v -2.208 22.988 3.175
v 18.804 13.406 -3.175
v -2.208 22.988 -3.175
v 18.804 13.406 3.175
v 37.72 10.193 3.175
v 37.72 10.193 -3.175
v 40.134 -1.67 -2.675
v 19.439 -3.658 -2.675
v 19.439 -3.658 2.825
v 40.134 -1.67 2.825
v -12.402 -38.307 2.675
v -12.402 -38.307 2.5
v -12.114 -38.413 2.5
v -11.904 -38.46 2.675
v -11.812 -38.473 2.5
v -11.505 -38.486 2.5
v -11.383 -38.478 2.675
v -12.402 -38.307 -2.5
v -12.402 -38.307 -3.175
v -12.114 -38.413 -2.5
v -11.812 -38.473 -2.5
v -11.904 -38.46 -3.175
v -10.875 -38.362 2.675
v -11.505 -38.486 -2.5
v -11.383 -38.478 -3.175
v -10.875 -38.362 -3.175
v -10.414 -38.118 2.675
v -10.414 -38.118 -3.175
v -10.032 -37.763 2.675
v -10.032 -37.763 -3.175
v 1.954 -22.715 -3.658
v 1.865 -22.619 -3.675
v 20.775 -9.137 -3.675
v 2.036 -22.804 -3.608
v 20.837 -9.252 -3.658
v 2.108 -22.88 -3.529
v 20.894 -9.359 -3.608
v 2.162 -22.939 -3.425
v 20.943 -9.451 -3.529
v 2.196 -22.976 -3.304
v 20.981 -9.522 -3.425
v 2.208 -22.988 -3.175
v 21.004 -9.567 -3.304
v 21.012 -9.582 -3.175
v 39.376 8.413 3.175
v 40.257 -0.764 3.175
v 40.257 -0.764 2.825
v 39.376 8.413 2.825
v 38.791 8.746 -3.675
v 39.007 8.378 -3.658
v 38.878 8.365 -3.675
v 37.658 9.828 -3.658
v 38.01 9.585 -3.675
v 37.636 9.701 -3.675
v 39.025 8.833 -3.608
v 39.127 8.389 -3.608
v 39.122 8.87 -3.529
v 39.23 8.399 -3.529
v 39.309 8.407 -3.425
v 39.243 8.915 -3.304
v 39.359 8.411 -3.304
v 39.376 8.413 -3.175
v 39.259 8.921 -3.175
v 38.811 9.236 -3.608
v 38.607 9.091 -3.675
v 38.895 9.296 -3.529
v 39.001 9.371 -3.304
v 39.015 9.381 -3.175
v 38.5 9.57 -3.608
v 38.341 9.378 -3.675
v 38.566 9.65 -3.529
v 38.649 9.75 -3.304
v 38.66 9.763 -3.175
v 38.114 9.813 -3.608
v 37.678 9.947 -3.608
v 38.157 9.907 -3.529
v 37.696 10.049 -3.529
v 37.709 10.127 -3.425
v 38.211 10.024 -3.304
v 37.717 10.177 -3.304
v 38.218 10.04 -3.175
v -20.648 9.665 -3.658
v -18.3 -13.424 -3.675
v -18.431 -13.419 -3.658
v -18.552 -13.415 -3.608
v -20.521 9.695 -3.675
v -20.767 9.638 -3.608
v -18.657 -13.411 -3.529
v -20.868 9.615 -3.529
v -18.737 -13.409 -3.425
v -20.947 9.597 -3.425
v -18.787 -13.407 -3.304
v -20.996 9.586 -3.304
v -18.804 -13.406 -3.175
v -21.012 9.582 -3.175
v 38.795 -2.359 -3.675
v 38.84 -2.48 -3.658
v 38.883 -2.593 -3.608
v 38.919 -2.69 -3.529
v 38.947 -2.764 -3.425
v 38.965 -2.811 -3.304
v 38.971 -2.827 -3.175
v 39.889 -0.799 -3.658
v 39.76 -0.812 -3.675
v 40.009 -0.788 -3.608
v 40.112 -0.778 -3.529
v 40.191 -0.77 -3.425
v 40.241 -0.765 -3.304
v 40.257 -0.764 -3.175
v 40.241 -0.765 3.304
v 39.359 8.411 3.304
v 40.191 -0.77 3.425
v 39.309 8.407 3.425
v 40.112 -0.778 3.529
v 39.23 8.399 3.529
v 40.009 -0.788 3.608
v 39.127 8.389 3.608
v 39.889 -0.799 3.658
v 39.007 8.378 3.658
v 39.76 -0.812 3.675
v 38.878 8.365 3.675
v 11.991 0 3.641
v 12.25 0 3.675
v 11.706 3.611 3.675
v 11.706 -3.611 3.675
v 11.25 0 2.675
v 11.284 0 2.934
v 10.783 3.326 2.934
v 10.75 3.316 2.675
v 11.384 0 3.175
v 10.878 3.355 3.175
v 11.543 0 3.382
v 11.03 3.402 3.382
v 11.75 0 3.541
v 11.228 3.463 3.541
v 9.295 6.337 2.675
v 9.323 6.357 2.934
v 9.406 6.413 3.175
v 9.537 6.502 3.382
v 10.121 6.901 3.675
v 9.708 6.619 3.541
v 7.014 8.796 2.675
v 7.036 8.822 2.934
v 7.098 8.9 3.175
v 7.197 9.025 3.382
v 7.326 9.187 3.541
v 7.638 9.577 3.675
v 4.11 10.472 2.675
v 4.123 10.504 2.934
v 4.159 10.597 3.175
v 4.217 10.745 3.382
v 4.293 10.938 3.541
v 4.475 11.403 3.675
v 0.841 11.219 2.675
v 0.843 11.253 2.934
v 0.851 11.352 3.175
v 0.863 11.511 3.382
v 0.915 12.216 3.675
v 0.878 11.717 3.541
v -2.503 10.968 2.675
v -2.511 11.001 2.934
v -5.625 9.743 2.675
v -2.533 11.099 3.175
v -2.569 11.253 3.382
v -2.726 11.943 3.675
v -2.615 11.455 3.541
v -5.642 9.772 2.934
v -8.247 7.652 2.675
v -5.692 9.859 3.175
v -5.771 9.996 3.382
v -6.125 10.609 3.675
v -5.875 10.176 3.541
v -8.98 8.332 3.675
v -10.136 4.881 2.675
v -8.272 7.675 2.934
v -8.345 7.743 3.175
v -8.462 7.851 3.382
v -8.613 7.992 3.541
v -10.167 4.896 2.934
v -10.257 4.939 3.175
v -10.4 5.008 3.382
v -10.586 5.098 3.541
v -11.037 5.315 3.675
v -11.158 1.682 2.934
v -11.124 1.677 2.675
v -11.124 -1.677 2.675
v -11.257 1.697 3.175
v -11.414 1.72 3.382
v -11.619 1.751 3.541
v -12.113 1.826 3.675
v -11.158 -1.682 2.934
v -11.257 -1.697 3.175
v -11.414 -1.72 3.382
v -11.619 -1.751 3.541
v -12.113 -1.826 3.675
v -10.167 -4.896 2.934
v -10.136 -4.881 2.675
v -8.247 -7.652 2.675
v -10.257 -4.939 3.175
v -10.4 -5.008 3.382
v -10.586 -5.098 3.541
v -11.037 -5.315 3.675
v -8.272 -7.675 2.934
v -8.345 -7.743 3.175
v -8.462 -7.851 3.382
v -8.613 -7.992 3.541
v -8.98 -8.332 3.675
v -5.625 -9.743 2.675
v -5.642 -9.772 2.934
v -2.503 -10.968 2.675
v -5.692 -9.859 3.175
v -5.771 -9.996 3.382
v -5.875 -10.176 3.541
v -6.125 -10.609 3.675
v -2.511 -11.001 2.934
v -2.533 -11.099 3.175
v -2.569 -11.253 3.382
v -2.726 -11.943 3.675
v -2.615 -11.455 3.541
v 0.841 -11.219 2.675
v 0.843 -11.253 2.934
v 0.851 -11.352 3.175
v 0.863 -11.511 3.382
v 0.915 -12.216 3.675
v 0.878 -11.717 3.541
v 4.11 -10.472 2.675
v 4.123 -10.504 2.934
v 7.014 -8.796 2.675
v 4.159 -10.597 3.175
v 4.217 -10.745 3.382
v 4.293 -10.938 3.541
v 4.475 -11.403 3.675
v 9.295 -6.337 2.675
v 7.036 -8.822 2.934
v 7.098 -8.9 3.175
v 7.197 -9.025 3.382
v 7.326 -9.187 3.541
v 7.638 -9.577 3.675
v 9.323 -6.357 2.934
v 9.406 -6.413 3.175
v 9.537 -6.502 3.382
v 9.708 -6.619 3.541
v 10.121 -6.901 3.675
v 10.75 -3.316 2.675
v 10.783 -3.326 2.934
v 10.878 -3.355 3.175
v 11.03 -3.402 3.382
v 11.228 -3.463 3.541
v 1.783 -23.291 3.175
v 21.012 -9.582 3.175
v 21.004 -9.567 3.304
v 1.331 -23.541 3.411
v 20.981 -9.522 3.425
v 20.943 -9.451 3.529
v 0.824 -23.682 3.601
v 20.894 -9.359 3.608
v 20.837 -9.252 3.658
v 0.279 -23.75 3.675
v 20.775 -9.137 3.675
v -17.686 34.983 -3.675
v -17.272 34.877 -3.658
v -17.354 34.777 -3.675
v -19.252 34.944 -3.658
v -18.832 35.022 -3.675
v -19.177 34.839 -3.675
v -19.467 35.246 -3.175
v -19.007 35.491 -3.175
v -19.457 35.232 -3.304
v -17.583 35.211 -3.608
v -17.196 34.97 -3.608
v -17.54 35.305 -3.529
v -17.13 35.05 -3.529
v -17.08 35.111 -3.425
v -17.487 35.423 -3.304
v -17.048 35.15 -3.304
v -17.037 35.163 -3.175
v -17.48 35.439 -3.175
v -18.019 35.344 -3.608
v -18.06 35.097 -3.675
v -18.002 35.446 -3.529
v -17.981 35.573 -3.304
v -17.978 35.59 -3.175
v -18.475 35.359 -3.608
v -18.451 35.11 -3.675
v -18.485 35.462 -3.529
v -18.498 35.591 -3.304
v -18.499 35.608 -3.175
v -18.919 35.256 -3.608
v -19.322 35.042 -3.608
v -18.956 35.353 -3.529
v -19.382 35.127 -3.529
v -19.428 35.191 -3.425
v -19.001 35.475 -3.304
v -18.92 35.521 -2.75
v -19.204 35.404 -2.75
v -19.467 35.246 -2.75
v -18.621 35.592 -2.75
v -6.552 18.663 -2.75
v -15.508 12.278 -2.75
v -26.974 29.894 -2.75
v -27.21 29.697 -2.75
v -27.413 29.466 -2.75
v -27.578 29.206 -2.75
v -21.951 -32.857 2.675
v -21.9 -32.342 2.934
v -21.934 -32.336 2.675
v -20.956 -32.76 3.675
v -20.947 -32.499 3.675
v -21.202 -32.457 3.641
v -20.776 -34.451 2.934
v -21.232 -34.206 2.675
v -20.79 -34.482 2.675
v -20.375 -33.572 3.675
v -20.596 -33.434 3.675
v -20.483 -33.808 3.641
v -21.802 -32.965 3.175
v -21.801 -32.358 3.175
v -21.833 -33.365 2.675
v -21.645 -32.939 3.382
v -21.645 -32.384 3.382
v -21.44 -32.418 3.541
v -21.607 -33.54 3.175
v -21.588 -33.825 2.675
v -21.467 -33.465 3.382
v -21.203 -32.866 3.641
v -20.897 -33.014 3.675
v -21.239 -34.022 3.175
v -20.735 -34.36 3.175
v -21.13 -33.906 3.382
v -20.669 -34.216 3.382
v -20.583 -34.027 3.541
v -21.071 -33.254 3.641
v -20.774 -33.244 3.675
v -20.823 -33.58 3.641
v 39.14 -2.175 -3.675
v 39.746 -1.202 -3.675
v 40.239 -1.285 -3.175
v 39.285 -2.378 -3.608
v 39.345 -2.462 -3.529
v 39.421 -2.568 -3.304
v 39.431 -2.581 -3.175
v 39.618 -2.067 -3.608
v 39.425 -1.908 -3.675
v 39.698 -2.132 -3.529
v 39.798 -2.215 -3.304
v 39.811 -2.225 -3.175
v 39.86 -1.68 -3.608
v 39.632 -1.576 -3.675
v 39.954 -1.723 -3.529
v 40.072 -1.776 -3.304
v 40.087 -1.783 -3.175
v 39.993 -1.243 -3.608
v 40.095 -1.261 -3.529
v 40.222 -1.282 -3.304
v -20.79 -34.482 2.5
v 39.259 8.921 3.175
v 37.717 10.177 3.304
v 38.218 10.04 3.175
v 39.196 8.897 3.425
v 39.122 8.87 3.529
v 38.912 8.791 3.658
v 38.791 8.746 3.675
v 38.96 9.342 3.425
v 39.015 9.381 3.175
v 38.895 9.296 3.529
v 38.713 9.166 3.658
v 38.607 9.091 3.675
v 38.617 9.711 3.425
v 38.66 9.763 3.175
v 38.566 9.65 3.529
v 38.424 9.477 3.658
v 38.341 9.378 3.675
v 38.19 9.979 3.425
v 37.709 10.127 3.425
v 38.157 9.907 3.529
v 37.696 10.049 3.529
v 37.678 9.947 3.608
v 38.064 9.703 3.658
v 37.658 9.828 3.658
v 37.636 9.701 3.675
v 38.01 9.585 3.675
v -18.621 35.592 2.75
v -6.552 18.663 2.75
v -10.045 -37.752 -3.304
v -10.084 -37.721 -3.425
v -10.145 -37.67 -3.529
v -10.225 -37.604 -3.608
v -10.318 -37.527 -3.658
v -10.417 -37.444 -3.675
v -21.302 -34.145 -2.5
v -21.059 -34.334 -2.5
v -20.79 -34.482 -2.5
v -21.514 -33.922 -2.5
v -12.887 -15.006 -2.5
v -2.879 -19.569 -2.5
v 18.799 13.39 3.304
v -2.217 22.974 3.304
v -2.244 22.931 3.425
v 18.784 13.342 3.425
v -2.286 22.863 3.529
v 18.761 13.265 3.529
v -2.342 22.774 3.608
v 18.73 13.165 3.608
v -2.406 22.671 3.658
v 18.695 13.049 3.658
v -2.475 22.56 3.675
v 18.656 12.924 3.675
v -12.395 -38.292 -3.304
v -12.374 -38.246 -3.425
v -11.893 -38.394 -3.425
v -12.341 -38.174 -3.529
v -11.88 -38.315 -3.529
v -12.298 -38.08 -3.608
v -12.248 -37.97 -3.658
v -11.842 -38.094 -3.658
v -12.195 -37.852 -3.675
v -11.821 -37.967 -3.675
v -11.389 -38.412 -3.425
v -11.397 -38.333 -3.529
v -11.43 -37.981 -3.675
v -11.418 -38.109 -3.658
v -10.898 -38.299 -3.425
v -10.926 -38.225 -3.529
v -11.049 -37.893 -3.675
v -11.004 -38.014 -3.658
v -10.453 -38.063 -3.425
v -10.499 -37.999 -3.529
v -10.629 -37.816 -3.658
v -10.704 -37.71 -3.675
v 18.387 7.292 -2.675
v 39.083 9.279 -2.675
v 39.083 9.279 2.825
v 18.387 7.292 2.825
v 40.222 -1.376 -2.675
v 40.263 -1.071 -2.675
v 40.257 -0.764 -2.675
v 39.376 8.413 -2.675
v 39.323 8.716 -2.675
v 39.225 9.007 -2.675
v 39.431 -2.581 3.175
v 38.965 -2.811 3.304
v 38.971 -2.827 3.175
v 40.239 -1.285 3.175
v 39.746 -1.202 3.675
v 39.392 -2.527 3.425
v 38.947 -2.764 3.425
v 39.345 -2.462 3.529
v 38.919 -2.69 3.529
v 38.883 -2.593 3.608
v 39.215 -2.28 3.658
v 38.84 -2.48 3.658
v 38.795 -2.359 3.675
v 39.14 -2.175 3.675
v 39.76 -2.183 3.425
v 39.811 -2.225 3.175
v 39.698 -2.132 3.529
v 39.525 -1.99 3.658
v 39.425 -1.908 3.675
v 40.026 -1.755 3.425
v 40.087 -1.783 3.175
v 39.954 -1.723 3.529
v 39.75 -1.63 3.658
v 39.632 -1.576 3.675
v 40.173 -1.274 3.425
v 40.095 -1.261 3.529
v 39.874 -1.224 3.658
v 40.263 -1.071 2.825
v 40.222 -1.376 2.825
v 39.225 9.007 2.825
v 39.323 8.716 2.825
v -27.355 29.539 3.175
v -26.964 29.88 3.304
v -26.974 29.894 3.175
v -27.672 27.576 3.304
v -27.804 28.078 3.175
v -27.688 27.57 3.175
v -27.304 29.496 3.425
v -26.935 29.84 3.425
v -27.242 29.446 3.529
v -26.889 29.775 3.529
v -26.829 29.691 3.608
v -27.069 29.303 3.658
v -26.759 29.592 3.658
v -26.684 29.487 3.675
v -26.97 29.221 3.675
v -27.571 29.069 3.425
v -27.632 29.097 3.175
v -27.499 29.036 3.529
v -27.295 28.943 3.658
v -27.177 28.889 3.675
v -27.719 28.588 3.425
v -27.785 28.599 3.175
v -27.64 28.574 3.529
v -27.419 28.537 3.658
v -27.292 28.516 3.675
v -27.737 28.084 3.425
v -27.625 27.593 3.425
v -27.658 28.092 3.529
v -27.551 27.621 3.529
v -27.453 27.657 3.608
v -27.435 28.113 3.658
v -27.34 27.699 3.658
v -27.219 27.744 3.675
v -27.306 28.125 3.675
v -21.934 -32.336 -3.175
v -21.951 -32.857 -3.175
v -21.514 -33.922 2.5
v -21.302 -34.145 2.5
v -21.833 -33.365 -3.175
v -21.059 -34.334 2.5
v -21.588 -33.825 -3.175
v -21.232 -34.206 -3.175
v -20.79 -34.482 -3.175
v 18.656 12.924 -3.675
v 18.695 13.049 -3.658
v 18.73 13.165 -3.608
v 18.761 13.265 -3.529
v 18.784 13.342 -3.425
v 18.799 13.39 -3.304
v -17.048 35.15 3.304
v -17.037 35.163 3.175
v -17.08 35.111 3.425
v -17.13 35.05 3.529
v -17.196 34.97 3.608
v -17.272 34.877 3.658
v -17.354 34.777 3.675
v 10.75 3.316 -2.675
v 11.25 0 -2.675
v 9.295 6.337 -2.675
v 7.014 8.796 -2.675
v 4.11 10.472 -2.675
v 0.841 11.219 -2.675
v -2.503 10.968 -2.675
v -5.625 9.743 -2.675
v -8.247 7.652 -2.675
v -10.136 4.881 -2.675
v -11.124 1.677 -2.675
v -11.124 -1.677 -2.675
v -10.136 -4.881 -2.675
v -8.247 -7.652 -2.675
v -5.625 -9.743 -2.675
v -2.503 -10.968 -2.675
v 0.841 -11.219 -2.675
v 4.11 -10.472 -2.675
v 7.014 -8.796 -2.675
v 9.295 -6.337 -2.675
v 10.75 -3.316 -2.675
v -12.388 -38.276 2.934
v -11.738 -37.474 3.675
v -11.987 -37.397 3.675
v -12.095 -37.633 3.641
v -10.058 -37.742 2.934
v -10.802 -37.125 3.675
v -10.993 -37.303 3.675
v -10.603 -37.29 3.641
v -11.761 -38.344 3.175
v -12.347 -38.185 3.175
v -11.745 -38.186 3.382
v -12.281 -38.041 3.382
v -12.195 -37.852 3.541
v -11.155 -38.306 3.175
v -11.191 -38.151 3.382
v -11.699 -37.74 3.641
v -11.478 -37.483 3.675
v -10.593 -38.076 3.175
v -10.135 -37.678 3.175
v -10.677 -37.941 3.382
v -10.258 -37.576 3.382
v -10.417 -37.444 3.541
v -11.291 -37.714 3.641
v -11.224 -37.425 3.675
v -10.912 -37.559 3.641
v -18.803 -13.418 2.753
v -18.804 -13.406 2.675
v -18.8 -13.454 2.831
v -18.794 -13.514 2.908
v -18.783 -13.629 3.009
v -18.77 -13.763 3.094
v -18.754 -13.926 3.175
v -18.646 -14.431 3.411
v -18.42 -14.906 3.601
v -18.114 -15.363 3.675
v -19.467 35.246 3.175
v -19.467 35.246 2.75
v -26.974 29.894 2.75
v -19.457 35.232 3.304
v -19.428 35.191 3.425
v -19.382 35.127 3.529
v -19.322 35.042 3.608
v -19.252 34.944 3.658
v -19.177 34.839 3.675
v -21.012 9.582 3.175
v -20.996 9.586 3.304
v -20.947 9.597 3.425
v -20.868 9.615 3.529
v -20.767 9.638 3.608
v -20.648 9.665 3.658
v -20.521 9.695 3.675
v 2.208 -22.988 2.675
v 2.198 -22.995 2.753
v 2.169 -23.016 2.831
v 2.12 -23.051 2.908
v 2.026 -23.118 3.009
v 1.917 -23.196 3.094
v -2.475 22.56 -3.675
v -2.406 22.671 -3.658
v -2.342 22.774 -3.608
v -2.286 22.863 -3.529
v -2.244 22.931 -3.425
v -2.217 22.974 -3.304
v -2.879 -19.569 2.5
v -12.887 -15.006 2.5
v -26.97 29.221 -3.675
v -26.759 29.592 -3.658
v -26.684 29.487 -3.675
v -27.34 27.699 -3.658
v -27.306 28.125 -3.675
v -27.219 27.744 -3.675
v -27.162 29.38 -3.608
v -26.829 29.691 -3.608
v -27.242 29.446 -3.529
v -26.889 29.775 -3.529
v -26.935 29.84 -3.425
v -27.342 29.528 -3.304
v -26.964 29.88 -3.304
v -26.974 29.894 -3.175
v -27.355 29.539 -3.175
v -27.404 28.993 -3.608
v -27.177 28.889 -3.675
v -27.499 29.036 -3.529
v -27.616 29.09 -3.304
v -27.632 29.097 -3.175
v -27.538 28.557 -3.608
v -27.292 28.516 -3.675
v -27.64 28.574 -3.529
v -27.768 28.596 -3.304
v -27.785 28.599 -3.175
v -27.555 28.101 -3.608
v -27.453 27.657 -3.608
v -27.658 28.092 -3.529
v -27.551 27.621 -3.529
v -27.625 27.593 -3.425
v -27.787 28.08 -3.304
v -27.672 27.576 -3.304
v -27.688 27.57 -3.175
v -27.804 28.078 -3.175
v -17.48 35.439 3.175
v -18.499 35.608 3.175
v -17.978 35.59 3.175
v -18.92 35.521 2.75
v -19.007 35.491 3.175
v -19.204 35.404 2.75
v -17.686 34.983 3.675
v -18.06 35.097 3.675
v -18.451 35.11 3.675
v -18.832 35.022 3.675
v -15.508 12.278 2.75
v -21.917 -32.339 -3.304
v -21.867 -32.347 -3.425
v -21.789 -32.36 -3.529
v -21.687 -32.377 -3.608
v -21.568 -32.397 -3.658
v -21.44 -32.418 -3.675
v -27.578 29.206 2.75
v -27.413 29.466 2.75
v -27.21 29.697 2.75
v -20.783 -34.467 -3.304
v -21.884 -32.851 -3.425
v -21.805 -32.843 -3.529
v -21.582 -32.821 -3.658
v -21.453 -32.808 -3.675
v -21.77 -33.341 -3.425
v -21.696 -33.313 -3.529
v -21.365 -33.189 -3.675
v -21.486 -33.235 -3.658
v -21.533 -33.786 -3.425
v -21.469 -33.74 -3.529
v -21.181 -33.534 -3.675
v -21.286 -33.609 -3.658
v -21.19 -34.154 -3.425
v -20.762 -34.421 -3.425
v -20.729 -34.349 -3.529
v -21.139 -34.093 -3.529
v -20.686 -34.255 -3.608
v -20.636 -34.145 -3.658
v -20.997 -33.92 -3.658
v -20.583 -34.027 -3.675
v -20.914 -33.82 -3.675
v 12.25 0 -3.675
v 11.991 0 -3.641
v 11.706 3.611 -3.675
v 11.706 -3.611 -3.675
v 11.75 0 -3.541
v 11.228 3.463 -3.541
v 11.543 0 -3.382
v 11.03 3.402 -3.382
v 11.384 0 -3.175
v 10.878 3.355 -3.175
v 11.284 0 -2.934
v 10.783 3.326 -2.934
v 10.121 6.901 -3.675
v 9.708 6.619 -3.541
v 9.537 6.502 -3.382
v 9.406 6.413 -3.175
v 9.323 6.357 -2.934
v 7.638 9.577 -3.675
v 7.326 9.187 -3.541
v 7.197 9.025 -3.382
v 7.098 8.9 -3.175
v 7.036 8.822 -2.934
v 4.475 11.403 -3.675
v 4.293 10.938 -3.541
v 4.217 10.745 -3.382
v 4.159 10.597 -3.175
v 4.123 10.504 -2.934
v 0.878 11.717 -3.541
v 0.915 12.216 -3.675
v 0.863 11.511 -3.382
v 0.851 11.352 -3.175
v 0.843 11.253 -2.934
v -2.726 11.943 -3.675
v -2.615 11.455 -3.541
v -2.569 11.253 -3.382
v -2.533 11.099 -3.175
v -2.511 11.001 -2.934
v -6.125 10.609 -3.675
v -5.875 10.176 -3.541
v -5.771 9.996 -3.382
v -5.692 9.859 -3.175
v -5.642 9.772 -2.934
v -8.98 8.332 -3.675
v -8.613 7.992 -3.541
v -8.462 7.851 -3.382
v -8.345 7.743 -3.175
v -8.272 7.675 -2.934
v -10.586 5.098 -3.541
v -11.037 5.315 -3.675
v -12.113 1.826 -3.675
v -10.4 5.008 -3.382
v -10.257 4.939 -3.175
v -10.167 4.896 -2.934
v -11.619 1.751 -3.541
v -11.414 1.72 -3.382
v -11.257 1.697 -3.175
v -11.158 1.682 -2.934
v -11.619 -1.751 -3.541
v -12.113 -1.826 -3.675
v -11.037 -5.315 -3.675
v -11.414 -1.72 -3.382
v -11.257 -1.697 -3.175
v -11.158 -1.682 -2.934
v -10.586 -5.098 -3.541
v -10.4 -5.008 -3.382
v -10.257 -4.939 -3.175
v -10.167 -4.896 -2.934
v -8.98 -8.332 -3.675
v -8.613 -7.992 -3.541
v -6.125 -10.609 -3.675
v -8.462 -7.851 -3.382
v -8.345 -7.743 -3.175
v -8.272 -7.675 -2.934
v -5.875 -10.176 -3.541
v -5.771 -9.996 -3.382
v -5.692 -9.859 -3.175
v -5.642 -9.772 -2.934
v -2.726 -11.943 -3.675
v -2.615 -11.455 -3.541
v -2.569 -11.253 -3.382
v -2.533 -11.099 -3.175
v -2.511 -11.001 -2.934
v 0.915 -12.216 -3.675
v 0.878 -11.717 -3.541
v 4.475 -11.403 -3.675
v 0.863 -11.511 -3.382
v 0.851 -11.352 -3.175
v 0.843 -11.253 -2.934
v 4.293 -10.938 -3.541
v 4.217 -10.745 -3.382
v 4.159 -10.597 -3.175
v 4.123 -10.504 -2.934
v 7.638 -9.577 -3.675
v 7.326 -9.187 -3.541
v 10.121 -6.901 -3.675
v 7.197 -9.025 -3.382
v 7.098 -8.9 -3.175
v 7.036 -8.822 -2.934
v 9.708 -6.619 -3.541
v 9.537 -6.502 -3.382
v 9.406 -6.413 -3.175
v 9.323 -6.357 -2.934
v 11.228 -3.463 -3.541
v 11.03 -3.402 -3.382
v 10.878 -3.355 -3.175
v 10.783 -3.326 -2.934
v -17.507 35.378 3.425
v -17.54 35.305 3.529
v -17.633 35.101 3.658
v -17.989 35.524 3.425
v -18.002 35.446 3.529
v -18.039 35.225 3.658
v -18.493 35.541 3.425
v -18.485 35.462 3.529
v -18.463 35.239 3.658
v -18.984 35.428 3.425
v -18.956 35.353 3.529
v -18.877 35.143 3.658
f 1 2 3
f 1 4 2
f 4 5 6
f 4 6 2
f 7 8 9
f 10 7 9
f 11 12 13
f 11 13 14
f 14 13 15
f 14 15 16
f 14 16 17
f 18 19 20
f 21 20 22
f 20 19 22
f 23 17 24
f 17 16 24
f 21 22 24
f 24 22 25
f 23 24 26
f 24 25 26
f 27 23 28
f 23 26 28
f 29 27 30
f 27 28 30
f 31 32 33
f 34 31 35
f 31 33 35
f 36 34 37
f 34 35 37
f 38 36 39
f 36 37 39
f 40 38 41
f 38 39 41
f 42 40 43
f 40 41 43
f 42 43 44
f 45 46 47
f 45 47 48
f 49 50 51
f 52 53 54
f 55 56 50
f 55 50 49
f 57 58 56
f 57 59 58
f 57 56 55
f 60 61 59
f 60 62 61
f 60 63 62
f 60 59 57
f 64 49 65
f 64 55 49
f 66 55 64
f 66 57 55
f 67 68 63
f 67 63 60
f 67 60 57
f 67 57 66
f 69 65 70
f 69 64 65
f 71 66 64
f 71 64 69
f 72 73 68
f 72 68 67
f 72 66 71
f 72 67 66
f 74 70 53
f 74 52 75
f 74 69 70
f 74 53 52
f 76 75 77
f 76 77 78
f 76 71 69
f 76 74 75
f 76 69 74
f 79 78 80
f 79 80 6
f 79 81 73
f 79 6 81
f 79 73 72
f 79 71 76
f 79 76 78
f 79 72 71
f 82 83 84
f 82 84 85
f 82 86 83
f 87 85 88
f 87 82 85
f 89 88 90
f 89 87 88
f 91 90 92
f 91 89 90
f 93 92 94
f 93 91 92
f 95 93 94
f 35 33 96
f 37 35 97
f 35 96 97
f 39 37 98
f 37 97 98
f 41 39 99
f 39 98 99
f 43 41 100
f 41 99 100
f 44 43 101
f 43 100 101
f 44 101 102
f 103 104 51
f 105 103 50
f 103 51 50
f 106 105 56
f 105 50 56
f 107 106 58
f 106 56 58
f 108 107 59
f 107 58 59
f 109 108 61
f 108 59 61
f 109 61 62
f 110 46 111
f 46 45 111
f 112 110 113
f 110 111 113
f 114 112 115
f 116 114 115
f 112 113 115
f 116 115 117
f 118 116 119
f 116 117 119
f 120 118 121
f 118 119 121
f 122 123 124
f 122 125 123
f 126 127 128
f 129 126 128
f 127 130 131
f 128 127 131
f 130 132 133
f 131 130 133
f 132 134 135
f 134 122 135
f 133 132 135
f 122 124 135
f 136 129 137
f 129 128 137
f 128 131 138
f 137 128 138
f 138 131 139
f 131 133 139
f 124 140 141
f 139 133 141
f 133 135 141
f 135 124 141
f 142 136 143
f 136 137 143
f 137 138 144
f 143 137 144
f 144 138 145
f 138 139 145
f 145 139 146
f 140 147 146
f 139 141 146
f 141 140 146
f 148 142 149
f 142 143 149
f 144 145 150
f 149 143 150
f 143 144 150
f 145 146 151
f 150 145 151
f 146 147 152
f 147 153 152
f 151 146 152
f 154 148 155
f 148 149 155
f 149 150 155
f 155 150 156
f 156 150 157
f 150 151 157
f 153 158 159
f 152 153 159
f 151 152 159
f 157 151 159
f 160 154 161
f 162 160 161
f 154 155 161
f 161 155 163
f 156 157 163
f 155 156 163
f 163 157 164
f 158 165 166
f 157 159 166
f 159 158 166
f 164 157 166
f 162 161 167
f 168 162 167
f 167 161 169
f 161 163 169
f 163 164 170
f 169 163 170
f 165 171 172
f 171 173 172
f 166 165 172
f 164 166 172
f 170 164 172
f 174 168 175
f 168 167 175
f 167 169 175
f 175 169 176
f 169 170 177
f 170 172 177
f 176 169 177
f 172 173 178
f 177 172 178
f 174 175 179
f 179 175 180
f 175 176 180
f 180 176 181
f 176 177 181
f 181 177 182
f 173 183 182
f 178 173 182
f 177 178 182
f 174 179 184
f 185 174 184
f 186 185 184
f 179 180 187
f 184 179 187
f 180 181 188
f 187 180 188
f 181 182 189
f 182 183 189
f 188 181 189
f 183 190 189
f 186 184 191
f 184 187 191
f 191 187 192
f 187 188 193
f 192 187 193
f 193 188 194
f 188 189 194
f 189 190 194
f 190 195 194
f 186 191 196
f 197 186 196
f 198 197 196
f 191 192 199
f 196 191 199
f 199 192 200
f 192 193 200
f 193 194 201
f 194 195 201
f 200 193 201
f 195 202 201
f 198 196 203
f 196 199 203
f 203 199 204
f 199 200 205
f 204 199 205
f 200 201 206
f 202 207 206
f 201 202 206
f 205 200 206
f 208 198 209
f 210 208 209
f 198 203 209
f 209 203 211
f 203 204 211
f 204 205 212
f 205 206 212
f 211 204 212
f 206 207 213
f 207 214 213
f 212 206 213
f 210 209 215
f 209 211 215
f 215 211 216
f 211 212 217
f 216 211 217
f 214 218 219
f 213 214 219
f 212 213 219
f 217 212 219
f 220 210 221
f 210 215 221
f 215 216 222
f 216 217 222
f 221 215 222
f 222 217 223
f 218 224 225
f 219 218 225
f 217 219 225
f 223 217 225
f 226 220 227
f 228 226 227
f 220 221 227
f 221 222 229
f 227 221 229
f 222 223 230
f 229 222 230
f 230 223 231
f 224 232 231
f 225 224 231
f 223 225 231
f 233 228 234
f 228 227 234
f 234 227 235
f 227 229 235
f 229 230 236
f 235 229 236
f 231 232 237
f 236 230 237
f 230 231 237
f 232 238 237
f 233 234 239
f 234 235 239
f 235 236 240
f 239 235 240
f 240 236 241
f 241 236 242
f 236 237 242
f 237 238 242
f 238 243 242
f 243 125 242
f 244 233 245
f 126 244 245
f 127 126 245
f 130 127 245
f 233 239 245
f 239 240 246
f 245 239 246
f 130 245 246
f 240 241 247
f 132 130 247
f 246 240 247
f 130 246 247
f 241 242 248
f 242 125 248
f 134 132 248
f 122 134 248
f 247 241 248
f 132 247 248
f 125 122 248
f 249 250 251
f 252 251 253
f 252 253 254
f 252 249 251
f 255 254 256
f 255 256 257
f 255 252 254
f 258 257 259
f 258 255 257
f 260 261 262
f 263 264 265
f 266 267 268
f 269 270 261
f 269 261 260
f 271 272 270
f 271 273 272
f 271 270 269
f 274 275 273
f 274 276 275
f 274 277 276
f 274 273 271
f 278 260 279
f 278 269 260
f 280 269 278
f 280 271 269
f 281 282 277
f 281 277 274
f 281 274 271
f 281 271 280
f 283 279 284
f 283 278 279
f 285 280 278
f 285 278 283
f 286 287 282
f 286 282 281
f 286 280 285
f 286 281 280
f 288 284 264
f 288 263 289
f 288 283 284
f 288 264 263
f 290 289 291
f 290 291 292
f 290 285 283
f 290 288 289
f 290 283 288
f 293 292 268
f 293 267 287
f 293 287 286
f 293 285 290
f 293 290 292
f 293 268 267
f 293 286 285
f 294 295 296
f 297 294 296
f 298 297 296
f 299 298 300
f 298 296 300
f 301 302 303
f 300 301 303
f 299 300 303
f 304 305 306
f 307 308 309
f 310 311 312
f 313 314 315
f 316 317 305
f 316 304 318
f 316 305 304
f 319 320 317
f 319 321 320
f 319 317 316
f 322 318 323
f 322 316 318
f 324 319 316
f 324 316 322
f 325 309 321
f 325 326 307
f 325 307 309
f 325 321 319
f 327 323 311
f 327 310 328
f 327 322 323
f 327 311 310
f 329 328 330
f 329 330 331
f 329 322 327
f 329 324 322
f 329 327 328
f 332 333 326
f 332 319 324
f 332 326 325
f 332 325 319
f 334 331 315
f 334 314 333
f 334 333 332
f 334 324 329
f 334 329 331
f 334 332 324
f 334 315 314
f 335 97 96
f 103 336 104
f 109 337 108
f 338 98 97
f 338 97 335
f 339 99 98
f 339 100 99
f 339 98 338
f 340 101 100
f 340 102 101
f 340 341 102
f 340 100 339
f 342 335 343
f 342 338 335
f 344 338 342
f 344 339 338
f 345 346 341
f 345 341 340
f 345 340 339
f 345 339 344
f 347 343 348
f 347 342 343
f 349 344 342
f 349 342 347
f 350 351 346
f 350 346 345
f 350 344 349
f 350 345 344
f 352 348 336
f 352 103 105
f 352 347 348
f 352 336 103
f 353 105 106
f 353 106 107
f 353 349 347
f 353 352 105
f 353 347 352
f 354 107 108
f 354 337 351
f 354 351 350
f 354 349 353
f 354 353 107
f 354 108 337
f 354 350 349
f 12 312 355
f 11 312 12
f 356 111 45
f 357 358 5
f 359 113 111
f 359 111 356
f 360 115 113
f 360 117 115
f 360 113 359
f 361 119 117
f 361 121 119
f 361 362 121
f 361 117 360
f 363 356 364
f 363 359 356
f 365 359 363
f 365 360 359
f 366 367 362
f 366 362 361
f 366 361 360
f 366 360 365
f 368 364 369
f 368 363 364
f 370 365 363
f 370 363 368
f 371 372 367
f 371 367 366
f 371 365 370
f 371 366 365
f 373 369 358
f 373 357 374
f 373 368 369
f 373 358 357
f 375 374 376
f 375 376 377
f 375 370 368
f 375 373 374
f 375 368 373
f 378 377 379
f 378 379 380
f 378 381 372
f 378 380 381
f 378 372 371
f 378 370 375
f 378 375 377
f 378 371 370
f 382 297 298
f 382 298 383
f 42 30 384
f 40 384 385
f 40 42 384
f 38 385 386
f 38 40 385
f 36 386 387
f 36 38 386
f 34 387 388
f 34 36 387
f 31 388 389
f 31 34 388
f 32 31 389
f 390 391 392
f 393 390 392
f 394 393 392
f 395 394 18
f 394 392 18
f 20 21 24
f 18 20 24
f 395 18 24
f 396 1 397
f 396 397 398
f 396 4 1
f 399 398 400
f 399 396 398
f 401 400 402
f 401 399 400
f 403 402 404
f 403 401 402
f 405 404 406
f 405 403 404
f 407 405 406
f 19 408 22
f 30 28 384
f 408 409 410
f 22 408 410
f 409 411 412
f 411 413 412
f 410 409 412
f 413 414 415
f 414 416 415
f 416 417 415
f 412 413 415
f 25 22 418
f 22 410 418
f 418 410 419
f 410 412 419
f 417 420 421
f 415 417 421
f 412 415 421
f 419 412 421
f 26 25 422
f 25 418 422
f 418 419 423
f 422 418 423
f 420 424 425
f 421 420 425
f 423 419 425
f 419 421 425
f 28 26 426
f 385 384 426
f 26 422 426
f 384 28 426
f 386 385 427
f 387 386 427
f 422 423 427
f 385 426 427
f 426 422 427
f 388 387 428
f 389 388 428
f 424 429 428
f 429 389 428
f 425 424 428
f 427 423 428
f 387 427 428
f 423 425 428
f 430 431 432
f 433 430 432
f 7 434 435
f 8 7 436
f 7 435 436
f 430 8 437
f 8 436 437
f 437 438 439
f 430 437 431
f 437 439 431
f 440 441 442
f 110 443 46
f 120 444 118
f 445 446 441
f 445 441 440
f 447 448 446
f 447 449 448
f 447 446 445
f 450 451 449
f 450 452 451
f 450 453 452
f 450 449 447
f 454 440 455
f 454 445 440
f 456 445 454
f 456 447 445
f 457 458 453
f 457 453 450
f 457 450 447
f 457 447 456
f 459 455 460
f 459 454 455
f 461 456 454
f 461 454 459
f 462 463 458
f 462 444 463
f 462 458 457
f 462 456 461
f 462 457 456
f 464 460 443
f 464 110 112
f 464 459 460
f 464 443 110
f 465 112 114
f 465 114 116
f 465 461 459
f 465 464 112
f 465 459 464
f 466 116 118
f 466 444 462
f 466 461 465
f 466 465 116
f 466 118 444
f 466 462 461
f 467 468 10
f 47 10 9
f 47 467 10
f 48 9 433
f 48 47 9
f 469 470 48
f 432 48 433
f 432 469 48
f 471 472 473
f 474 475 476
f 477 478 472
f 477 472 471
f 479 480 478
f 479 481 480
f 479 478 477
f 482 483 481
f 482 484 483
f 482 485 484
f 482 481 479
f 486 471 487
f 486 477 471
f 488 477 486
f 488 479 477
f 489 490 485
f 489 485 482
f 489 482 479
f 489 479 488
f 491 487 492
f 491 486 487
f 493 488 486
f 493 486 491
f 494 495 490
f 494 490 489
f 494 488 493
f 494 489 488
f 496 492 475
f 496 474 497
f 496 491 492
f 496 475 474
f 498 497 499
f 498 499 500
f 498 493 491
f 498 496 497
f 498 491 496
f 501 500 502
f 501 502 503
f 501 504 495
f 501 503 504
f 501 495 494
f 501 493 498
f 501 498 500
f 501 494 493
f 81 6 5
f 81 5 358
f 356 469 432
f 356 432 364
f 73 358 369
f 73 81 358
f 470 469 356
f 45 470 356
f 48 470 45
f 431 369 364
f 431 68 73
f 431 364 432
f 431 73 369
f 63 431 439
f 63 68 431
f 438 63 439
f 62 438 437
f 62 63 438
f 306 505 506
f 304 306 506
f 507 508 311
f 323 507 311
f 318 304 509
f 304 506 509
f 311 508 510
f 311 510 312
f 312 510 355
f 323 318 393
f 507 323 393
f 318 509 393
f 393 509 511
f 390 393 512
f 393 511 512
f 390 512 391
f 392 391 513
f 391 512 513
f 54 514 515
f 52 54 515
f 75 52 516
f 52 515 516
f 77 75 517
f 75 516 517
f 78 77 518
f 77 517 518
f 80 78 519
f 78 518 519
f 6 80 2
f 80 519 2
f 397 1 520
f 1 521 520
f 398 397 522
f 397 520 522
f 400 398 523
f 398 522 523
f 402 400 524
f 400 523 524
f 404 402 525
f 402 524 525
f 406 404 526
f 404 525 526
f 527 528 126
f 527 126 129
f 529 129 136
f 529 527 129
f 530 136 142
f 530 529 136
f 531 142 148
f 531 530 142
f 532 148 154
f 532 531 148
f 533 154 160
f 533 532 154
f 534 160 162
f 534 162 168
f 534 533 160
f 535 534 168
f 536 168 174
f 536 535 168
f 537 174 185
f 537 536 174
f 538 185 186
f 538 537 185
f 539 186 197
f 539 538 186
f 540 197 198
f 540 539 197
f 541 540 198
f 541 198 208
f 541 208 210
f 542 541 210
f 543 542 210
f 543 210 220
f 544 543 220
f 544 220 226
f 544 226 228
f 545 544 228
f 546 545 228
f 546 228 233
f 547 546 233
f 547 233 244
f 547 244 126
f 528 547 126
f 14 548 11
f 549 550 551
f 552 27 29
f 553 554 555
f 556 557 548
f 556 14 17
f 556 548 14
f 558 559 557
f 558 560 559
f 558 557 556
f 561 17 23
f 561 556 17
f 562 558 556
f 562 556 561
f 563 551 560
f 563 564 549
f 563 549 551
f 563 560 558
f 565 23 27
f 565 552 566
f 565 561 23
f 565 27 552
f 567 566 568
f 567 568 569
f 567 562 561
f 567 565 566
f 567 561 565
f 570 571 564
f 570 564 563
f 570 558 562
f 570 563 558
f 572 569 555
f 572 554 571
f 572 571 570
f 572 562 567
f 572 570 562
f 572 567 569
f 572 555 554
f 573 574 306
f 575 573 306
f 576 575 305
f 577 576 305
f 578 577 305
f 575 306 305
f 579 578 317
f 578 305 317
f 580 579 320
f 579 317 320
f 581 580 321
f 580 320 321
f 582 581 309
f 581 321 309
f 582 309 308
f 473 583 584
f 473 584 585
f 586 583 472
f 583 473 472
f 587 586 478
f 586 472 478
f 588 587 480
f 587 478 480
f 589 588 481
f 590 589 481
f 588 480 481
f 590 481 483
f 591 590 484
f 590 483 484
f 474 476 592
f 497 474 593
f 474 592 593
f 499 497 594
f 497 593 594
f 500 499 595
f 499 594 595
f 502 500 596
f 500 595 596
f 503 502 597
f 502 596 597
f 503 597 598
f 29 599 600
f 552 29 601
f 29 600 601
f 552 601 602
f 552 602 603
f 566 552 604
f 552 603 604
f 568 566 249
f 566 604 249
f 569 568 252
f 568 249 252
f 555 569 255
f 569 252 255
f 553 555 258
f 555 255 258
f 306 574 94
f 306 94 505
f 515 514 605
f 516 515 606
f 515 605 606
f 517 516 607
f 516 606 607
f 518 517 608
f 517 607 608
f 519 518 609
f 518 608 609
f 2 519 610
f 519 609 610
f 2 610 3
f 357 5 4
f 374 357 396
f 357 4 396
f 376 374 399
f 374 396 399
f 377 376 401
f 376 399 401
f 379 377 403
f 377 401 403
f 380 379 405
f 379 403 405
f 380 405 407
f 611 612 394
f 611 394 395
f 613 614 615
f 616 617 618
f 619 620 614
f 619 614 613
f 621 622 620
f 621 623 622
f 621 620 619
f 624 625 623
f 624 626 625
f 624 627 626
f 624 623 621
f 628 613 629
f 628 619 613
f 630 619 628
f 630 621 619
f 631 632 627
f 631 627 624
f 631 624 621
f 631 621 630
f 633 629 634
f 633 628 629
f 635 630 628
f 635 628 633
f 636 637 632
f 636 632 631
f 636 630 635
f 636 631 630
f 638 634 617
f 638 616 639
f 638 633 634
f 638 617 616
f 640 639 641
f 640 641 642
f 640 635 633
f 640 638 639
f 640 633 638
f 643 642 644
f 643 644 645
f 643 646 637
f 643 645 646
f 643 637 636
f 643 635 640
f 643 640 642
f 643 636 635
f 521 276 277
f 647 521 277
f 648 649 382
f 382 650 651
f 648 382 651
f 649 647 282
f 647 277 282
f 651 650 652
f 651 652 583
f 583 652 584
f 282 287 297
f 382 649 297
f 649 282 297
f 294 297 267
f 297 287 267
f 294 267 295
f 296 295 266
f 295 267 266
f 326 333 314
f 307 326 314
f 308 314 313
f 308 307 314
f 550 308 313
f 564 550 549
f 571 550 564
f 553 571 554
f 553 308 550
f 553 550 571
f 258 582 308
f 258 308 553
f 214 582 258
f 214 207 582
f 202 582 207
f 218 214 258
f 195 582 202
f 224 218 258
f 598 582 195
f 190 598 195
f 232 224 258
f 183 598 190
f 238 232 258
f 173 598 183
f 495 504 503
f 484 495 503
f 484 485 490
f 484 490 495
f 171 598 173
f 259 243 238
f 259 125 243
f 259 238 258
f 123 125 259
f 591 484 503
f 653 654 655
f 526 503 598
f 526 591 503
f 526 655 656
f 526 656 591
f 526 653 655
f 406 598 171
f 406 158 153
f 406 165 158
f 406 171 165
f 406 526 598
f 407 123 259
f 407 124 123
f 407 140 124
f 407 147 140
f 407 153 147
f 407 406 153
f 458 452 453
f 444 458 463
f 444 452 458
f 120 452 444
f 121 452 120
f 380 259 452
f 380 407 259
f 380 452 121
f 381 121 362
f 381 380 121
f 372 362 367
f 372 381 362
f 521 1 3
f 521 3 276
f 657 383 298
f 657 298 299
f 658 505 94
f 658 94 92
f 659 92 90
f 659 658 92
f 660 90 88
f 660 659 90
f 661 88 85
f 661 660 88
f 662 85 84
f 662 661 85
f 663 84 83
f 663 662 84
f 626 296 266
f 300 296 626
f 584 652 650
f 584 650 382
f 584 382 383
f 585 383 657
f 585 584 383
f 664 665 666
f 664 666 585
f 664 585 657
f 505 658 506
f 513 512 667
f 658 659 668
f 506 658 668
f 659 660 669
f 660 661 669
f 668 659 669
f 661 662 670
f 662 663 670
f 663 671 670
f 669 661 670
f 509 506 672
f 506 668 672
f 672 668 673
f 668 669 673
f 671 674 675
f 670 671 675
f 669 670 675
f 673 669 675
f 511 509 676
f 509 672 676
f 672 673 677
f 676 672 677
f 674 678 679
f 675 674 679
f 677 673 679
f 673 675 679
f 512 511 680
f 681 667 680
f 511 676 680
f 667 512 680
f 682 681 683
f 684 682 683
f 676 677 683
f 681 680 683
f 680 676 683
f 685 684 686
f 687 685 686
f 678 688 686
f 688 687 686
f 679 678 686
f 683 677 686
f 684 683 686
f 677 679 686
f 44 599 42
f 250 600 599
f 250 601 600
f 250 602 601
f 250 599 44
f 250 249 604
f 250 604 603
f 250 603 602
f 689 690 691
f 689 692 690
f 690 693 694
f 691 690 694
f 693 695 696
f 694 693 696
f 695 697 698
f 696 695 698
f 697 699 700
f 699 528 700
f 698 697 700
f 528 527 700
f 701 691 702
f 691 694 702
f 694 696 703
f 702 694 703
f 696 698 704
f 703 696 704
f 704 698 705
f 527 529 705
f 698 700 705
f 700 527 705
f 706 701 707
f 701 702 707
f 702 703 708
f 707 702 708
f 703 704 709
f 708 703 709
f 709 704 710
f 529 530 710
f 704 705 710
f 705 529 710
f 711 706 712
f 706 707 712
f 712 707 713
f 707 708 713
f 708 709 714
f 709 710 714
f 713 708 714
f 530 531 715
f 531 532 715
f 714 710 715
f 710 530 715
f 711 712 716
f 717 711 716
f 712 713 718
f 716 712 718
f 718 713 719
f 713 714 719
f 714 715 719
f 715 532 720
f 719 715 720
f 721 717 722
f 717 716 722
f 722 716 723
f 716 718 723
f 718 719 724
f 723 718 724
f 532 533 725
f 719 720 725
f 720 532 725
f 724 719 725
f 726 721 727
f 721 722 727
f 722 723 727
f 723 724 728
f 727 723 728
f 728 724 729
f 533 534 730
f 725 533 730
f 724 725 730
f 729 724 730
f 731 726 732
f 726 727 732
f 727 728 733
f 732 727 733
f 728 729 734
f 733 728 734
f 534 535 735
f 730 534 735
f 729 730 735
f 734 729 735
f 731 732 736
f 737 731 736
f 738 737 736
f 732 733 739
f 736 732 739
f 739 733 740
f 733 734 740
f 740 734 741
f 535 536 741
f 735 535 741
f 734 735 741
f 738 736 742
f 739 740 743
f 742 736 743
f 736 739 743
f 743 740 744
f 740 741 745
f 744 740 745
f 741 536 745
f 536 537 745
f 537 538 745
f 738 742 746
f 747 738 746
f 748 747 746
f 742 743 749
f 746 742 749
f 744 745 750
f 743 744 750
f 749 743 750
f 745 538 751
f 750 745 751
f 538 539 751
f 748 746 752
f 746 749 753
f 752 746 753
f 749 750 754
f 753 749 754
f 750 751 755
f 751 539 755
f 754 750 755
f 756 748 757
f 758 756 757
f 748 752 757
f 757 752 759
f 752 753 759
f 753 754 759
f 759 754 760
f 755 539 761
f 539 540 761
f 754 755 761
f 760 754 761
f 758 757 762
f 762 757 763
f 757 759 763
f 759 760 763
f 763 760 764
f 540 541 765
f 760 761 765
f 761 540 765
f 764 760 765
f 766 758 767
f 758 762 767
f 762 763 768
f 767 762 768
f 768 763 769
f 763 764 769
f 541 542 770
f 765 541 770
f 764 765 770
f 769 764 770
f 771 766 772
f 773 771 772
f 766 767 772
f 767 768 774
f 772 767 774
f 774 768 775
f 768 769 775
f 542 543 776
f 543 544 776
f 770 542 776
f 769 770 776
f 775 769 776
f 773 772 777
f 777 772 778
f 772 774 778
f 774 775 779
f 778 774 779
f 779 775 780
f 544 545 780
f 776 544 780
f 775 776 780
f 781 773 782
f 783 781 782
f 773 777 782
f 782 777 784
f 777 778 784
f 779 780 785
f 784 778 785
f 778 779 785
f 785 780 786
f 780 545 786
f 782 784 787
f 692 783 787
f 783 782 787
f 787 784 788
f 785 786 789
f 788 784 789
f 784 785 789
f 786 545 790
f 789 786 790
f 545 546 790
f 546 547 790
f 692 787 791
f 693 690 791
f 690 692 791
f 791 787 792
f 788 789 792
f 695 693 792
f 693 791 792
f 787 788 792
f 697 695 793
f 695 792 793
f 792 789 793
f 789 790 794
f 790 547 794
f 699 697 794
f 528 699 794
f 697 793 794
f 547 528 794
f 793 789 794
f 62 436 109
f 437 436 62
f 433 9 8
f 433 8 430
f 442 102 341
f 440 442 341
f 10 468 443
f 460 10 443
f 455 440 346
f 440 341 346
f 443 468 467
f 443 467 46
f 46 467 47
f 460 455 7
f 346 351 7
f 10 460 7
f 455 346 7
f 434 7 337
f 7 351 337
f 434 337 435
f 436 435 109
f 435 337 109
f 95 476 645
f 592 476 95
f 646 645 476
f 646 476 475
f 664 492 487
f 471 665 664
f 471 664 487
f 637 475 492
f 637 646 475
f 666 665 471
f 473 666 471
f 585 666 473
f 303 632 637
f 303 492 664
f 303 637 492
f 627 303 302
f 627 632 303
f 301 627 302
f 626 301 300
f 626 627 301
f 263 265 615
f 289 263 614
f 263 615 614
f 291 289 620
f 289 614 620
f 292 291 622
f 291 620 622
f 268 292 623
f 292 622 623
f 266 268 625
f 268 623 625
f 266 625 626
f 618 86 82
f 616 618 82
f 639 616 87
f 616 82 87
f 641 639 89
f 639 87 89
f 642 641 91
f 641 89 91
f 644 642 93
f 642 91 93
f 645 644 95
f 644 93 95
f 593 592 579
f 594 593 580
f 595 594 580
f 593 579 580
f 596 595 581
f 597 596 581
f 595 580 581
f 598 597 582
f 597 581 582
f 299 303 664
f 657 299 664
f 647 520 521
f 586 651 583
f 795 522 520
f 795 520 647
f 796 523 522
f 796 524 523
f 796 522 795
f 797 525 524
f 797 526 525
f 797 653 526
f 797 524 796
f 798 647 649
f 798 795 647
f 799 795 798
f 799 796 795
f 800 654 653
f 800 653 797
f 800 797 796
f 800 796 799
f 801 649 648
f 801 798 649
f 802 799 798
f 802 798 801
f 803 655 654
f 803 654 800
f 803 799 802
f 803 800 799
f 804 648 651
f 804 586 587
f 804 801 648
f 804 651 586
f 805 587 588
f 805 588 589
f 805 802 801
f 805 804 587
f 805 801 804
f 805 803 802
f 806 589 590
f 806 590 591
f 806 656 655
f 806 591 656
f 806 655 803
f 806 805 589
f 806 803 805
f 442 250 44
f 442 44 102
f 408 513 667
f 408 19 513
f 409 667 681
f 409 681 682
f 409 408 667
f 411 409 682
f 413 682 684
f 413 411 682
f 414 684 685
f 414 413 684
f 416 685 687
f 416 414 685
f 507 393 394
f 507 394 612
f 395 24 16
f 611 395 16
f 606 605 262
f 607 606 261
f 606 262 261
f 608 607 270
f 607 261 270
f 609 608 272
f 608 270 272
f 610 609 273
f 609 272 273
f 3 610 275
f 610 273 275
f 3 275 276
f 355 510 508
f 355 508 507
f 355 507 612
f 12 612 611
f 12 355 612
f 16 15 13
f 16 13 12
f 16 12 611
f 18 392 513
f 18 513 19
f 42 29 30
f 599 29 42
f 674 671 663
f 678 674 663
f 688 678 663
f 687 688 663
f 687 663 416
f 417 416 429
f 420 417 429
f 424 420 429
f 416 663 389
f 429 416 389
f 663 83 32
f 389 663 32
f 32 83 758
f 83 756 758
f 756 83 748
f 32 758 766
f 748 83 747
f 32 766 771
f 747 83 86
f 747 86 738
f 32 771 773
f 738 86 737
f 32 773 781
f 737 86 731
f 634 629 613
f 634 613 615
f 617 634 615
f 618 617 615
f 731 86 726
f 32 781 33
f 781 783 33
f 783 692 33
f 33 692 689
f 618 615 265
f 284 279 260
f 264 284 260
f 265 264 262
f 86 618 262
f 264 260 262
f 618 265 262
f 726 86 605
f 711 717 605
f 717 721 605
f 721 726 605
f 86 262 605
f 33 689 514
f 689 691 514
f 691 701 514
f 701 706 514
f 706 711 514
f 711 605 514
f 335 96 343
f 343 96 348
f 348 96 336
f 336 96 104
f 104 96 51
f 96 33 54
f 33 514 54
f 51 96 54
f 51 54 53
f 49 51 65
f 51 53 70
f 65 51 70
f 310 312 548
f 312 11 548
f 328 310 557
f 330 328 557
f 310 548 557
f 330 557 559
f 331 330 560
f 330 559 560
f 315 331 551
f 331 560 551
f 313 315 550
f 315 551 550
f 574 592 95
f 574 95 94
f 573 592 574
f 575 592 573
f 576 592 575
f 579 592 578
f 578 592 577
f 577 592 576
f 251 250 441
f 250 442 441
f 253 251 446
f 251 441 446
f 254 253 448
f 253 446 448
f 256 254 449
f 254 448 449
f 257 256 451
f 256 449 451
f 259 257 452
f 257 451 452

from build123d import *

# Parameters (mm, degrees)
F0_R         = 11.25
F1_DEPTH     = 2.175
F2_R         = 11.25
F3_DEPTH     = 1.5
F5_W         = 11
F5_H         = 5.5
F6_DEPTH     = 21
F7_W         = 11
F7_H         = 5.5
F8_DEPTH     = 21
F9_W         = 11
F9_H         = 5
F10_DEPTH    = 21
F11_T1_DEPTH = 15.005727874
F12_R        = 1
F13_R        = 0.5
F14_R        = 0.5
F15_R        = 0.5
F16_R        = 0.5
F17_R        = 0.5
F18_R        = 0.5
F19_R        = 0.5
F20_R        = 1


# Not quite as in the source:
# - a fillet or chamfer that OpenCascade refuses, or shapes differently, is made with other operations: its cross-section is extruded or revolved along the edge and cut away or added


with BuildPart() as f1:
    # F0 (on Top) → F1 (new body, symmetric)
    with BuildSketch(Plane.XY):
        Polygon((-2.2081266769, 22.9882037122), (-21.0124317406, 9.5818080591), (-18.8043050636, -13.4063956531), (2.2081266769, -22.9882037122), (21.0124317406, -9.5818080591), (18.8043050636, 13.4063956531), align=None)
        Circle(F0_R, mode=Mode.SUBTRACT)
        Polygon((-28.2205584175, 29.0052973062), (-21.0124317406, 9.5818080591), (-2.2081266769, 22.9882037122), (-18.2205584175, 36.1347262363), align=None)
        Polygon((2.2081266769, -22.9882037122), (-18.8043050636, -13.4063956531), (-22.1833116707, -33.8468295789), (-11.0090451027, -38.9423691517), align=None)
        Polygon((39.2296035202, 9.9370718455), (18.8043050636, 13.4063956531), (21.0124317406, -9.5818080591), (40.4038700882, -2.2878966574), align=None)
    extrude(amount=F1_DEPTH, both=True)

    # F2 (on face) → F3 (join)
    with BuildSketch(Plane.XY.offset(2.175)):
        Polygon((-18.8043050636, -13.4063956531), (-22.1833116707, -33.8468295789), (-11.0090451027, -38.9423691517), (2.2081266769, -22.9882037122), (21.0124317406, -9.5818080591), (40.4038700882, -2.2878966574), (39.2296035202, 9.9370718455), (18.8043050636, 13.4063956531), (-2.2081266769, 22.9882037122), (-18.2205584175, 36.1347262363), (-28.2205584175, 29.0052973062), (-21.0124317406, 9.5818080591), align=None)
        Circle(F2_R, mode=Mode.SUBTRACT)
    extrude(amount=F3_DEPTH)

    # F4: F1 across plane


with BuildPart() as f1_1:
    add(f1.part)
    add(f1.part.mirror(Plane.XY))

    # F5 (on face) → F6 (cut)
    with BuildSketch(Plane(origin=(39.8167368042, 3.824587594, 0), x_dir=(-0.0956146899, 0.9954184201, 0), z_dir=(0.9954184201, 0.0956146899, 0))):
        with Locations((0.0001179833, 0.075)):
            Rectangle(F5_W, F5_H)
    extrude(amount=-F6_DEPTH, mode=Mode.SUBTRACT)

    # F7 (on face) → F8 (cut)
    with BuildSketch(Plane(origin=(-23.2205584175, 32.5700117712, 0), x_dir=(-0.8142502943, -0.5805139604, 0), z_dir=(-0.5805139604, 0.8142502943, 0))):
        with Locations((0.0003820167, 0)):
            Rectangle(F7_W, F7_H)
    extrude(amount=-F8_DEPTH, mode=Mode.SUBTRACT)

    # F9 (on face) → F10 (cut)
    with BuildSketch(Plane(origin=(-16.5961783867, -36.3945993653, 0), x_dir=(0.9098649841, -0.4149044597, 0), z_dir=(-0.4149044597, -0.9098649841, 0))):
        with Locations((0.0001179833, 0)):
            Rectangle(F9_W, F9_H)
    extrude(amount=-F10_DEPTH, mode=Mode.SUBTRACT)

    # F11: fillet of radius 2 on 6 edges, made by hand

    # F11_s2 → F11_t1 (cut)
    with BuildSketch(Plane.XY.offset(-7.502863937)):
        with BuildLine():
            ThreePointArc((-17.0371647686, 35.1631366918), (-18.2382120361, 35.6162160874), (-19.4672941524, 35.2458748546))
            Line((-19.4672941524, 35.2458748546), (-18.2205584175, 36.1347262363))
            Line((-18.2205584175, 36.1347262363), (-17.0371647686, 35.1631366918))
        make_face()
        with BuildLine():
            ThreePointArc((-27.6878441198, 27.5698105427), (-27.7246206597, 28.8529484789), (-26.9738226827, 29.8941486878))
            Line((-26.9738226827, 29.8941486878), (-28.2205584175, 29.0052973062))
            Line((-28.2205584175, 29.0052973062), (-27.6878441198, 27.5698105427))
        make_face()
        with BuildLine():
            ThreePointArc((-21.9335872676, -32.336185844), (-21.7254419003, -33.6028629865), (-20.7901759265, -34.4821087062))
            Line((-20.7901759265, -34.4821087062), (-22.1833116707, -33.8468295789))
            Line((-22.1833116707, -33.8468295789), (-21.9335872676, -32.336185844))
        make_face()
        with BuildLine():
            ThreePointArc((-12.4021808468, -38.3070900243), (-11.125076027, -38.4367000411), (-10.0322342476, -37.7632816551))
            Line((-10.0322342476, -37.7632816551), (-11.0090451027, -38.9423691517))
            Line((-11.0090451027, -38.9423691517), (-12.4021808468, -38.3070900243))
        make_face()
        with BuildLine():
            ThreePointArc((38.9707520362, -2.8269508478), (39.9636539364, -2.0133531008), (40.2574700789, -0.7637661484))
            Line((40.2574700789, -0.7637661484), (40.4038700882, -2.2878966574))
            Line((40.4038700882, -2.2878966574), (38.9707520362, -2.8269508478))
        make_face()
        with BuildLine():
            ThreePointArc((37.7200783674, 10.1934711124), (38.8496966867, 9.5837515621), (39.3760035295, 8.4129413364))
            Line((39.3760035295, 8.4129413364), (39.2296035202, 9.9370718455))
            Line((39.2296035202, 9.9370718455), (37.7200783674, 10.1934711124))
        make_face()
    extrude(amount=F11_T1_DEPTH, mode=Mode.SUBTRACT)

    # F12
    f12_edges = [f1_1.edges().sort_by_distance(p)[0] for p in [
        (-16.596178, -36.394599, 3.675),
    ]]
    fillet(f12_edges, radius=F12_R)

    # F13
    f13_edges = [f1_1.edges().sort_by_distance(p)[0] for p in [
        (29.991592, -6.204379, 3.675),
    ]]
    fillet(f13_edges, radius=F13_R)

    # F14
    f14_edges = [f1_1.edges().sort_by_distance(p)[0] for p in [
        (-23.220558, 32.570012, 3.675),
    ]]
    fillet(f14_edges, radius=F14_R)

    # F15
    f15_edges = [f1_1.edges().sort_by_distance(p)[0] for p in [
        (-19.908368, -1.912294, 3.675),
        (11.610279, -16.285006, 3.675),
        (8.298089, 18.1973, 3.675),
    ]]
    fillet(f15_edges, radius=F15_R)

    # F16
    f16_edges = [f1_1.edges().sort_by_distance(p)[0] for p in [
        (-24.350138, 18.575809, -3.675),
    ]]
    fillet(f16_edges, radius=F16_R)

    # F17
    f17_edges = [f1_1.edges().sort_by_distance(p)[0] for p in [
        (28.262192, 11.799933, -3.675),
    ]]
    fillet(f17_edges, radius=F17_R)

    # F18
    f18_edges = [f1_1.edges().sort_by_distance(p)[0] for p in [
        (-3.912054, -30.375743, -3.675),
    ]]
    fillet(f18_edges, radius=F18_R)

    # F19
    f19_edges = [f1_1.edges().sort_by_distance(p)[0] for p in [
        (-19.908368, -1.912294, -3.675),
        (11.610279, -16.285006, -3.675),
        (8.298089, 18.1973, -3.675),
    ]]
    fillet(f19_edges, radius=F19_R)

    # F20
    f20_edges = [f1_1.edges().sort_by_distance(p)[0] for p in [
        (-11.25, 0, 3.675),
        (-11.25, 0, -3.675),
    ]]
    fillet(f20_edges, radius=F20_R)


solid = f1_1.part
